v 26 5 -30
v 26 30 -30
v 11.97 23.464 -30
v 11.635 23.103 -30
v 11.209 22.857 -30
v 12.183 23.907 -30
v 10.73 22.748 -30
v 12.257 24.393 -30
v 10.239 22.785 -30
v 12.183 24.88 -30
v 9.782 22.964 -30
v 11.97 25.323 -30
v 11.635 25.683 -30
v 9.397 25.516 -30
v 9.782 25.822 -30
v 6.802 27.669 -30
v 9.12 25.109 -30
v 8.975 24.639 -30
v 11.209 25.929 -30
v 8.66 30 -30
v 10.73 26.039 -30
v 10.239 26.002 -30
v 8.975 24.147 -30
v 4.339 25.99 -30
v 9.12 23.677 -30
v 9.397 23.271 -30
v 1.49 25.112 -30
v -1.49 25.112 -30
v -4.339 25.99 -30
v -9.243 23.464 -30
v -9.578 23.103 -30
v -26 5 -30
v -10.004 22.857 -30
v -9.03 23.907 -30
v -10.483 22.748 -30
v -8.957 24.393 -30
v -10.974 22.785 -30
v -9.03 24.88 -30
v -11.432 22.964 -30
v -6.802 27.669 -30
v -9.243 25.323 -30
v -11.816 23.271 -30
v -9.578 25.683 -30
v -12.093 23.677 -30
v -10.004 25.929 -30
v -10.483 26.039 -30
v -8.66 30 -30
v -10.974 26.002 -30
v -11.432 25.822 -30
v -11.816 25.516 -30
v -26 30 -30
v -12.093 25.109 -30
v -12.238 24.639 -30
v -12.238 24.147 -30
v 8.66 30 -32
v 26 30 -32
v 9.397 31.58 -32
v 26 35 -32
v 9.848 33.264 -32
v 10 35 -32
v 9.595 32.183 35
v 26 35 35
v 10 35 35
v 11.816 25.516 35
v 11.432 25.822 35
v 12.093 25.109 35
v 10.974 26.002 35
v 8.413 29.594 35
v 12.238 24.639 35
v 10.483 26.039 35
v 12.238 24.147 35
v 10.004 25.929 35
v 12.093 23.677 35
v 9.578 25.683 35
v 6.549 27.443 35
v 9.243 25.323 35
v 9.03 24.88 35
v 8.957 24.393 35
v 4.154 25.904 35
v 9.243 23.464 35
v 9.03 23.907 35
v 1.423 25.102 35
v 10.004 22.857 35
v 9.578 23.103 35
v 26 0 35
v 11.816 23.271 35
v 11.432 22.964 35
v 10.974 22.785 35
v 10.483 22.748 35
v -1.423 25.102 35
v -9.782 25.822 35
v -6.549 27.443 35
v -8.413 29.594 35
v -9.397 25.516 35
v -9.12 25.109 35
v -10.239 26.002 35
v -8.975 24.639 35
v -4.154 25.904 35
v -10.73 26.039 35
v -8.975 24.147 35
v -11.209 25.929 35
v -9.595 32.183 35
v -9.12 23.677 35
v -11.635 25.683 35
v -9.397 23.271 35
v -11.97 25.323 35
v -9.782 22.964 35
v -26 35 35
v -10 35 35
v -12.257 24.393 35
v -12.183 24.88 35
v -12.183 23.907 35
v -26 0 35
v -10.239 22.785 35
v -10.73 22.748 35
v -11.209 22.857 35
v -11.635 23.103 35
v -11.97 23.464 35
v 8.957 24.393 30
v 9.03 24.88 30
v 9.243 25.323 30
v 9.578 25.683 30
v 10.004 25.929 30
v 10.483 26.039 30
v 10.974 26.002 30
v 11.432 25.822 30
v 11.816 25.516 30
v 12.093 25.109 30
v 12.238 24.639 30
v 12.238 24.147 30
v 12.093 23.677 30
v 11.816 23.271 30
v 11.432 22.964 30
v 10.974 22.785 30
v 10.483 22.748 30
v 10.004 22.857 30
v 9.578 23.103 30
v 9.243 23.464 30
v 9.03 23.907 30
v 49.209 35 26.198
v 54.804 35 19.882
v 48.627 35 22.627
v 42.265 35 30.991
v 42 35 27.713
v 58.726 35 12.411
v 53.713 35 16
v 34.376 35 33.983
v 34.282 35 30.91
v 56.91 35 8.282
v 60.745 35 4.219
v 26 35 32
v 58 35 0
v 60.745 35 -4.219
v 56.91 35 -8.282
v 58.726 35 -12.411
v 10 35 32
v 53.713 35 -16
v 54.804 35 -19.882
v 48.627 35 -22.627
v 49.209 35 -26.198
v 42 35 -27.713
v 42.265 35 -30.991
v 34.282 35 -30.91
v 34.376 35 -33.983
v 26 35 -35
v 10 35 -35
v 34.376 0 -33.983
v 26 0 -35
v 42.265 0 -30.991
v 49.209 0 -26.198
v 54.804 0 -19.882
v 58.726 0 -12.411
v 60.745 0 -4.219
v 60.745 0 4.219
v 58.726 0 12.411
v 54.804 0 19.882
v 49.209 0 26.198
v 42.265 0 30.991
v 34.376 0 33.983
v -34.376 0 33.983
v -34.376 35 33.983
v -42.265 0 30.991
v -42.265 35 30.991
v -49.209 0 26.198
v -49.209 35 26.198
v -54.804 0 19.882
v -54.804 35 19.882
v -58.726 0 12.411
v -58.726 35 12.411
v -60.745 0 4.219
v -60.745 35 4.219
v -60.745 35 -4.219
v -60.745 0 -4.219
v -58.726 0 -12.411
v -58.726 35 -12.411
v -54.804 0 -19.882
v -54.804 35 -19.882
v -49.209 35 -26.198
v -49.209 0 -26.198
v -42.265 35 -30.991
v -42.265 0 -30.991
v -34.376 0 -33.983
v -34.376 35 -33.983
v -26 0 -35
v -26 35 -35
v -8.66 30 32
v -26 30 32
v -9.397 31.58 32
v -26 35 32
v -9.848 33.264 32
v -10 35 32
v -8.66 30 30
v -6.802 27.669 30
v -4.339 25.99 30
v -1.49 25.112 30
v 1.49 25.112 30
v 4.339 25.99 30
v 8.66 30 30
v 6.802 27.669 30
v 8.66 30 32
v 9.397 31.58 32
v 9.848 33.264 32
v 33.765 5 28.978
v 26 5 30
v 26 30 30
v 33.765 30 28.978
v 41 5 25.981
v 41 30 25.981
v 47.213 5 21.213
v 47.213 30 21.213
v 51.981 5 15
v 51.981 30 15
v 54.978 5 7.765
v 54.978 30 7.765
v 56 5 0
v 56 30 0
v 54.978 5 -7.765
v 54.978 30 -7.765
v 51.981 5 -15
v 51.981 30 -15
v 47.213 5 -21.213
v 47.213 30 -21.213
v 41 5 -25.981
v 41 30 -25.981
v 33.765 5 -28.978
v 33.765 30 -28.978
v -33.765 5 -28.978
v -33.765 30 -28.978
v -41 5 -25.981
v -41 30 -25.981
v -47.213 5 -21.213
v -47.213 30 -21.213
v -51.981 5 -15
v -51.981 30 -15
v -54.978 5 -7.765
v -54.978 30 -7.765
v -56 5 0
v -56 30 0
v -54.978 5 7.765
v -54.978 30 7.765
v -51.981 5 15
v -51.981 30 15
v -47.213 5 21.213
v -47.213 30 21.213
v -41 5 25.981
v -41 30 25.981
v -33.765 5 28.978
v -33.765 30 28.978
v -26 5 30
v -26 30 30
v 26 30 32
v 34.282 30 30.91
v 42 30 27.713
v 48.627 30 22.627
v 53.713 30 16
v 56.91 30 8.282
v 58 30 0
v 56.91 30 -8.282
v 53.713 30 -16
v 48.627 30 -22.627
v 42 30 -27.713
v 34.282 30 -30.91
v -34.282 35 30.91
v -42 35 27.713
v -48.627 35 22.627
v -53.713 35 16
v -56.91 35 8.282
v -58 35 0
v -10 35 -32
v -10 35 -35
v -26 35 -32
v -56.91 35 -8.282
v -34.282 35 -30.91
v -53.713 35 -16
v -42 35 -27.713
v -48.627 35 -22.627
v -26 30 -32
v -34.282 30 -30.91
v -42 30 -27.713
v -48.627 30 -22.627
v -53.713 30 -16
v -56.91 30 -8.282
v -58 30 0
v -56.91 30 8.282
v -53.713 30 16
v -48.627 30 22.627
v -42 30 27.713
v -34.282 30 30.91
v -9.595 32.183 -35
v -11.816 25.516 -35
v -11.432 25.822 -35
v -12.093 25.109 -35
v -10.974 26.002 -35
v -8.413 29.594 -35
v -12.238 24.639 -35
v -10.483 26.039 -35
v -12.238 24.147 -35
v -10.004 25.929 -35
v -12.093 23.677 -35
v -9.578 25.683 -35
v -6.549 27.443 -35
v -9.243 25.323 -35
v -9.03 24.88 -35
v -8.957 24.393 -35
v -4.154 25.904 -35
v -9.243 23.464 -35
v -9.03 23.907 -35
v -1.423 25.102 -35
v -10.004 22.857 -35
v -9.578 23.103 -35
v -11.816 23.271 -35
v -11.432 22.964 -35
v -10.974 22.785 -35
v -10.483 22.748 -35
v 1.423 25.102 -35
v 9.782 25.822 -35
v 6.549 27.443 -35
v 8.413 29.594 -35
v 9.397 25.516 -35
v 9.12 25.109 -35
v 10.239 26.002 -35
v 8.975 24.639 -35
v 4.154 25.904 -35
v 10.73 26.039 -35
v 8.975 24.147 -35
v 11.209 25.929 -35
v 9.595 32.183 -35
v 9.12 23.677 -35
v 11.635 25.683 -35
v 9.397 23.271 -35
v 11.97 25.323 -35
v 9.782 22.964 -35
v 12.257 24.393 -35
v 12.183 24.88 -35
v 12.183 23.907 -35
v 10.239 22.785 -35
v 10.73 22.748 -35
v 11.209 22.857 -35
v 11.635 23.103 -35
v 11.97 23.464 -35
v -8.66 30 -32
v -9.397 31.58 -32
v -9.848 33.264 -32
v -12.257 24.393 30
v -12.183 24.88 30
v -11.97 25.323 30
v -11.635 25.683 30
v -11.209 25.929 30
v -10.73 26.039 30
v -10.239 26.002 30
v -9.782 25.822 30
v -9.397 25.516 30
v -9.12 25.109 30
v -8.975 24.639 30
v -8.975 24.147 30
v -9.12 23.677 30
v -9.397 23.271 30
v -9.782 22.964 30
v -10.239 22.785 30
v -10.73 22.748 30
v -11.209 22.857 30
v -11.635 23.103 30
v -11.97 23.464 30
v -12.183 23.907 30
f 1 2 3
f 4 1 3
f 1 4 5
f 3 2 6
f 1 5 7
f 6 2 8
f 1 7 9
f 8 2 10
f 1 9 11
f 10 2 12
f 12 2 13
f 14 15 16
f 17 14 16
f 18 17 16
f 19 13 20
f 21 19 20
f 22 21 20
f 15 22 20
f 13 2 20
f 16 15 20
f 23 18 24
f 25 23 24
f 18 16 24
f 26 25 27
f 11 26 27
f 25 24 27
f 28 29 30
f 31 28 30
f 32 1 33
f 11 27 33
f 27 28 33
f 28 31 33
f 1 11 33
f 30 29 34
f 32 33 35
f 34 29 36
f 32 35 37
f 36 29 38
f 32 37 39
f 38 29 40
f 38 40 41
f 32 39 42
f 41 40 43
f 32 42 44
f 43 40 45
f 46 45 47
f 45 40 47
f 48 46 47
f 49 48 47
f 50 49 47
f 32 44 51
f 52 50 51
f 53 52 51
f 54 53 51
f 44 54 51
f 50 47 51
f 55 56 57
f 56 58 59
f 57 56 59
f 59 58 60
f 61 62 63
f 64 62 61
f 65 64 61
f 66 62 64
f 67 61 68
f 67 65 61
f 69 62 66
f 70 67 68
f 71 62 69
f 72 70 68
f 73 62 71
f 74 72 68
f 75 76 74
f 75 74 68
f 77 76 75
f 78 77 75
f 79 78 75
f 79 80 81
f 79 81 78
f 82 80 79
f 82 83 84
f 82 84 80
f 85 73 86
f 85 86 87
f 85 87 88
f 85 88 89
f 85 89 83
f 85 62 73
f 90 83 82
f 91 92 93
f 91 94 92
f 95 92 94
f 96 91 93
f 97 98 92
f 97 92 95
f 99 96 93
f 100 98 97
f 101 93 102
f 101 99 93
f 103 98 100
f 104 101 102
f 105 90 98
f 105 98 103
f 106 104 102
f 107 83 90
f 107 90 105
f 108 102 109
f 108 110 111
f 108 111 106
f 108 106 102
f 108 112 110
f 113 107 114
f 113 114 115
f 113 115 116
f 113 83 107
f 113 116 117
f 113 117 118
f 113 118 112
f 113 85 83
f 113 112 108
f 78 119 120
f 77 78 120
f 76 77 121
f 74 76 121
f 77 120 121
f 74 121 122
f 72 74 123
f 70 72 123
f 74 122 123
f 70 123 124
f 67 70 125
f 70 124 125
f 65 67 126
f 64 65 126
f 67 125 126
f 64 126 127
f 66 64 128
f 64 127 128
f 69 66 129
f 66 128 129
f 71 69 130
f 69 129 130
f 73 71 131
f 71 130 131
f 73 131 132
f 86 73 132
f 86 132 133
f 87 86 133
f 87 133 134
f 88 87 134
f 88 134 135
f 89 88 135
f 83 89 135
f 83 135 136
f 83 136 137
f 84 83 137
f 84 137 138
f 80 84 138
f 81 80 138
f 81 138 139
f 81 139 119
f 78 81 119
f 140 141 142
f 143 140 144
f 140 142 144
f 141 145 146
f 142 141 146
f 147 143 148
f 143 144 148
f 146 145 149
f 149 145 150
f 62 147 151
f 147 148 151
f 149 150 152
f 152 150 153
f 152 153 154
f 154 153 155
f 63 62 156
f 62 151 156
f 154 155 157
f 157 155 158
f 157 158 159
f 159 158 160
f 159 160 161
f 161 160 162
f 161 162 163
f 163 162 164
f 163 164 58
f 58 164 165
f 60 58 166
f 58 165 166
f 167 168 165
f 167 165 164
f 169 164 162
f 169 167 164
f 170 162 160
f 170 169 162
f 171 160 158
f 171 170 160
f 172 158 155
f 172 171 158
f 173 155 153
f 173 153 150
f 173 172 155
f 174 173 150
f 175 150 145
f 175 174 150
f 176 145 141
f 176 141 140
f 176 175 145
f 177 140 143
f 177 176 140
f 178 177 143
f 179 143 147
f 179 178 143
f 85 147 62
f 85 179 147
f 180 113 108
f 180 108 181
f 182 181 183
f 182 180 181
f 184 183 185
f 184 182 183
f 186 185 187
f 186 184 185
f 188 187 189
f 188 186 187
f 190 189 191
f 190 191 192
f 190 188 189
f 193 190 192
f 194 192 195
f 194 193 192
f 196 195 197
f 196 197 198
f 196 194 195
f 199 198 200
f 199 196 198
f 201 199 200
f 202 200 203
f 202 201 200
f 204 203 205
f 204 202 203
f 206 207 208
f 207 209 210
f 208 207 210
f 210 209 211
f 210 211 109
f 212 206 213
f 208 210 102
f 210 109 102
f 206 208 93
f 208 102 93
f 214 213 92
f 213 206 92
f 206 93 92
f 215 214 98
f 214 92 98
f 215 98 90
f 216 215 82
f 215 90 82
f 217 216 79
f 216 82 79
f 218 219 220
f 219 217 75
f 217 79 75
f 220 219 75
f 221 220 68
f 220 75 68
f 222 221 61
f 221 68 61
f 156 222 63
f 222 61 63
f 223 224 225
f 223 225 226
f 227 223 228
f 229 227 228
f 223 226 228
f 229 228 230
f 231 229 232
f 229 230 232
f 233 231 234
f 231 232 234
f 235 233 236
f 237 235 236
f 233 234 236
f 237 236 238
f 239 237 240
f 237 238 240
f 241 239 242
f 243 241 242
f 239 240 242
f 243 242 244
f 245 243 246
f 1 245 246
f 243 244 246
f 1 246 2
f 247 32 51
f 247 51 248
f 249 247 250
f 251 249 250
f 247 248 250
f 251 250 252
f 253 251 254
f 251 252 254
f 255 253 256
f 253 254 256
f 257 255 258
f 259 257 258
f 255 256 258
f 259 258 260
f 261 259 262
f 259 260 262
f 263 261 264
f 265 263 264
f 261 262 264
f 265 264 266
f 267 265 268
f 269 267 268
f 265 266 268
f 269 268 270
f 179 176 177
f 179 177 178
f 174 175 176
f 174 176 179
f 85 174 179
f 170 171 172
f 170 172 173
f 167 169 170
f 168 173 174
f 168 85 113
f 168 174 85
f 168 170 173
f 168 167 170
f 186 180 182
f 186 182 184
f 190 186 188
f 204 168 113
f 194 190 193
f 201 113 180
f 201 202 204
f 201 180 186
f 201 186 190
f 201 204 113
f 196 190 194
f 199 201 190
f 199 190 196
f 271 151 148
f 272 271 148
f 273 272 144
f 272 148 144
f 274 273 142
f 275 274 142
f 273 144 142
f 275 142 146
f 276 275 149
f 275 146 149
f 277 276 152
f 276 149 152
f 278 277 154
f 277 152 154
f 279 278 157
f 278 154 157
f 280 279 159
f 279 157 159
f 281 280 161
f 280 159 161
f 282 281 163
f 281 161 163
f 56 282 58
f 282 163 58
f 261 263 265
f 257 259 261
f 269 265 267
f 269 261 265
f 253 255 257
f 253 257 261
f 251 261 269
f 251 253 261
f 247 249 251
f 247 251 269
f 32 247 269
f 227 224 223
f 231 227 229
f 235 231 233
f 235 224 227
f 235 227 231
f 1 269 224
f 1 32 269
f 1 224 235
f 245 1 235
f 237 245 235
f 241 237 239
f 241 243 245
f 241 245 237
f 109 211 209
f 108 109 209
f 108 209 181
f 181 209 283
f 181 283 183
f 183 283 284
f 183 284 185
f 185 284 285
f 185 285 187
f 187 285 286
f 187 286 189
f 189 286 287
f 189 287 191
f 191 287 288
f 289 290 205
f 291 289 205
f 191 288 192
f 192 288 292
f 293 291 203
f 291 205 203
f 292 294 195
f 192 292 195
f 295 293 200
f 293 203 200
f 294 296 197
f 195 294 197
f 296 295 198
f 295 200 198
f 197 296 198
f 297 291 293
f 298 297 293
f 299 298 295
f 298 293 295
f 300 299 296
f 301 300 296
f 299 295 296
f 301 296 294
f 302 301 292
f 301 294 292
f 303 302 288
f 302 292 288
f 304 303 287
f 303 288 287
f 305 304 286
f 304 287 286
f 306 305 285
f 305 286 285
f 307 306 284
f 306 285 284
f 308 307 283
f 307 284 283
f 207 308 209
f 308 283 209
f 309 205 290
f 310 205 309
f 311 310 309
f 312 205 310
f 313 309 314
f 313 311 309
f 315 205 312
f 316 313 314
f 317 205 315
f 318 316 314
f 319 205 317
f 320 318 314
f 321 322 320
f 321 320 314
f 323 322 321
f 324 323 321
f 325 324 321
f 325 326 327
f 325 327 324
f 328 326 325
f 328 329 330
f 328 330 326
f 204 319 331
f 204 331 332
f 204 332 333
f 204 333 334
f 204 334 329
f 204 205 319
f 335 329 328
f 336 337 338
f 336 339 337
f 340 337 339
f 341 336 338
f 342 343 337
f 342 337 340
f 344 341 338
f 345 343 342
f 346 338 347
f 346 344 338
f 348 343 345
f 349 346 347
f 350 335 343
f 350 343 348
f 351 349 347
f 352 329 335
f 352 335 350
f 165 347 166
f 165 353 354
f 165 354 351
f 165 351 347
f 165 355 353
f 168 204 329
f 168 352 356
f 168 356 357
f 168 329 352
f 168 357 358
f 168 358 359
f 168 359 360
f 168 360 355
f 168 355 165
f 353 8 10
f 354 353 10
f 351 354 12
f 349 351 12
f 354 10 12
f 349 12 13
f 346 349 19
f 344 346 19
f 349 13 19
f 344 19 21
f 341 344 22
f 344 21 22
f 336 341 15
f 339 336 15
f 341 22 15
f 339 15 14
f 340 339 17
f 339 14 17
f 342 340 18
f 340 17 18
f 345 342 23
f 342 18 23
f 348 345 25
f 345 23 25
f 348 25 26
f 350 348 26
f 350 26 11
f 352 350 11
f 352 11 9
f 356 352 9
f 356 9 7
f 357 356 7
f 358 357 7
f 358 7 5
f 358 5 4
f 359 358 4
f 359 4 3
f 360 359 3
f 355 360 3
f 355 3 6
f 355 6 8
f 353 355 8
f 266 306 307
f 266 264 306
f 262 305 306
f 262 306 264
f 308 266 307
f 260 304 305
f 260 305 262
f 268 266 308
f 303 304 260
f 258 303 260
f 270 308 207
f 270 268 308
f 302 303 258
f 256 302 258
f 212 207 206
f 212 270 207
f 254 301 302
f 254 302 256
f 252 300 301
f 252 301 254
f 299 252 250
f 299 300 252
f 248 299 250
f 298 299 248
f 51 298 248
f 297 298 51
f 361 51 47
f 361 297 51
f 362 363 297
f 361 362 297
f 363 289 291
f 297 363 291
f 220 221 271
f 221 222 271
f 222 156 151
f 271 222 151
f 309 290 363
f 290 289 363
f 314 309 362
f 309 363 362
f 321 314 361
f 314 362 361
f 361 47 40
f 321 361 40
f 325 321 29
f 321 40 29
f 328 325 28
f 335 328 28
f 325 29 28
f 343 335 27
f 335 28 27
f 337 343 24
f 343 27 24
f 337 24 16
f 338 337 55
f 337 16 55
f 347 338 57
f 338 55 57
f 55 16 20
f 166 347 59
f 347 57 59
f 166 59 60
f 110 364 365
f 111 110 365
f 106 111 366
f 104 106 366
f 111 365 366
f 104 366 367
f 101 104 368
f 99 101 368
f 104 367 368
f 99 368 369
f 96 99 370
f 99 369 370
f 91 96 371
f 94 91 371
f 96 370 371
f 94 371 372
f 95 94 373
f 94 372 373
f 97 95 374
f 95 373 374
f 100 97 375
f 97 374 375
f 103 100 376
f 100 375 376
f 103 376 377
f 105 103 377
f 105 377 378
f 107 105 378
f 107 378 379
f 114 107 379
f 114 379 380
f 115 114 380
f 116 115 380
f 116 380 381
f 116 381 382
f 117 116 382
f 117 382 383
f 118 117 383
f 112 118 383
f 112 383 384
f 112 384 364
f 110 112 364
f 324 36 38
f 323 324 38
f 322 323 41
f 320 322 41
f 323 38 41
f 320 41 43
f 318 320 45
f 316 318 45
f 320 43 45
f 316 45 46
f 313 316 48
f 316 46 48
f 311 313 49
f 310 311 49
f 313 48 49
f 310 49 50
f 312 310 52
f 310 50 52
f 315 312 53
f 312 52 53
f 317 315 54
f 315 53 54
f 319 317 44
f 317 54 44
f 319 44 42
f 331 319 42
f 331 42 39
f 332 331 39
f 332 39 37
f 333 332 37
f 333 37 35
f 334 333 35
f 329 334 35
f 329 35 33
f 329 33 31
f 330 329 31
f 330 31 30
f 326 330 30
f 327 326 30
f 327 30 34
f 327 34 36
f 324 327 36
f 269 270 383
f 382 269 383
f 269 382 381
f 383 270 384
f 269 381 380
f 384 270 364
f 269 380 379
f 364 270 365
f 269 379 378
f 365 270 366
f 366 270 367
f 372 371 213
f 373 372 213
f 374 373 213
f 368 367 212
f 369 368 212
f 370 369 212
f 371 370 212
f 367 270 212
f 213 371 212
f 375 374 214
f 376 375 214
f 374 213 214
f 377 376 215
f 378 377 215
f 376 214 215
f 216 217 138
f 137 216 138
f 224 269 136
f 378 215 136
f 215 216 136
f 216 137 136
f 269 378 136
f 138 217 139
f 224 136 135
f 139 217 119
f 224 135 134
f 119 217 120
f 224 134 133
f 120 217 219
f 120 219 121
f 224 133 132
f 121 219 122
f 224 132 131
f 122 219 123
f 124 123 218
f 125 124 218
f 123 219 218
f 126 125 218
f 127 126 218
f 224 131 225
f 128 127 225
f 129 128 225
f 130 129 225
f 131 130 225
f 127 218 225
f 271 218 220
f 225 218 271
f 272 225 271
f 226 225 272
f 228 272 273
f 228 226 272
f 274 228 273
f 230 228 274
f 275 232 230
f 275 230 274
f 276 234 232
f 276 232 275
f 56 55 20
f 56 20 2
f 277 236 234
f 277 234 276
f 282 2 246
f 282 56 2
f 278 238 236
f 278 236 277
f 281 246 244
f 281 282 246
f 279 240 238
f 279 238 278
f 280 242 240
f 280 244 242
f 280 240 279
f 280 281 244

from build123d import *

# Parameters (mm, degrees)
EXTRUDE_1_DEPTH          = 35
CUT_EXTRUDE_1_DEPTH      = 30
SKETCH_3_R               = 10
CUT_EXTRUDE_2_DEPTH      = 1
CUT_EXTRUDE_2_DEPTH_BACK = 71
CUT_EXTRUDE_3_DEPTH      = 5
HOLE_WIZARD_M4_1_D       = 3.3
HOLE_WIZARD_M4_1_DEPTH   = 5
HOLE_WIZARD_M4_2_D       = 3.3
HOLE_WIZARD_M4_2_DEPTH   = 5


with BuildPart() as part:
    # 스케치1 → 보스-돌출1 (new body)
    with BuildSketch(Plane(origin=(0, 0, 0), x_dir=(1, 0, 0), z_dir=(0, 1, 0))):
        with BuildLine():
            Line((-26, 35), (26, 35))
            ThreePointArc((26, 35), (61, 0), (26, -35))
            Line((26, -35), (-26, -35))
            ThreePointArc((-26, -35), (-61, 0), (-26, 35))
        make_face()
    extrude(amount=EXTRUDE_1_DEPTH)

    # 스케치2 → 컷-돌출1 (cut)
    with BuildSketch(Plane(origin=(0, 35, 0), x_dir=(1, 0, 0), z_dir=(0, 1, 0))):
        with BuildLine():
            Line((26, 30), (-26, 30))
            ThreePointArc((-26, 30), (-56, 0), (-26, -30))
            Line((-26, -30), (26, -30))
            ThreePointArc((26, -30), (56, 0), (26, 30))
        make_face()
    extrude(amount=-CUT_EXTRUDE_1_DEPTH, mode=Mode.SUBTRACT)

    # 스케치3 → 컷-돌출2 (cut, two sides)
    with BuildSketch(Plane.XY.offset(35)) as cut_extrude_2_sk:
        with Locations((0, 35)):
            Circle(SKETCH_3_R)
    extrude(amount=CUT_EXTRUDE_2_DEPTH, mode=Mode.SUBTRACT)
    extrude(cut_extrude_2_sk.sketch, amount=-CUT_EXTRUDE_2_DEPTH_BACK, mode=Mode.SUBTRACT)

    # 스케치4 → 컷-돌출3 (cut)
    with BuildSketch(Plane(origin=(0, 35, 0), x_dir=(1, 0, 0), z_dir=(0, 1, 0))):
        with BuildLine():
            Line((-26, -32), (26, -32))
            ThreePointArc((26, -32), (58, 0), (26, 32))
            Line((26, 32), (-26, 32))
            ThreePointArc((-26, 32), (-58, 0), (-26, -32))
        make_face()
        with BuildLine():
            Line((-26, -30), (26, -30))
            ThreePointArc((26, -30), (56, 0), (26, 30))
            Line((26, 30), (-26, 30))
            ThreePointArc((-26, 30), (-56, 0), (-26, -30))
        make_face(mode=Mode.SUBTRACT)
    extrude(amount=-CUT_EXTRUDE_3_DEPTH, mode=Mode.SUBTRACT)

    # M4 나사 구멍1
    with Locations(Plane.XY.offset(35)):
        with Locations((-10.606601718, 24.393398282), (10.606601718, 24.393398282)):
            Hole(HOLE_WIZARD_M4_1_D / 2, depth=HOLE_WIZARD_M4_1_DEPTH)

    # M4 나사 구멍2
    with Locations(Plane(origin=(0, 0, -35), x_dir=(-1, 0, 0), z_dir=(0, 0, -1))):
        with Locations((-10.606601718, 24.393398282), (10.606601718, 24.393398282)):
            Hole(HOLE_WIZARD_M4_2_D / 2, depth=HOLE_WIZARD_M4_2_DEPTH)


solid = part.part
